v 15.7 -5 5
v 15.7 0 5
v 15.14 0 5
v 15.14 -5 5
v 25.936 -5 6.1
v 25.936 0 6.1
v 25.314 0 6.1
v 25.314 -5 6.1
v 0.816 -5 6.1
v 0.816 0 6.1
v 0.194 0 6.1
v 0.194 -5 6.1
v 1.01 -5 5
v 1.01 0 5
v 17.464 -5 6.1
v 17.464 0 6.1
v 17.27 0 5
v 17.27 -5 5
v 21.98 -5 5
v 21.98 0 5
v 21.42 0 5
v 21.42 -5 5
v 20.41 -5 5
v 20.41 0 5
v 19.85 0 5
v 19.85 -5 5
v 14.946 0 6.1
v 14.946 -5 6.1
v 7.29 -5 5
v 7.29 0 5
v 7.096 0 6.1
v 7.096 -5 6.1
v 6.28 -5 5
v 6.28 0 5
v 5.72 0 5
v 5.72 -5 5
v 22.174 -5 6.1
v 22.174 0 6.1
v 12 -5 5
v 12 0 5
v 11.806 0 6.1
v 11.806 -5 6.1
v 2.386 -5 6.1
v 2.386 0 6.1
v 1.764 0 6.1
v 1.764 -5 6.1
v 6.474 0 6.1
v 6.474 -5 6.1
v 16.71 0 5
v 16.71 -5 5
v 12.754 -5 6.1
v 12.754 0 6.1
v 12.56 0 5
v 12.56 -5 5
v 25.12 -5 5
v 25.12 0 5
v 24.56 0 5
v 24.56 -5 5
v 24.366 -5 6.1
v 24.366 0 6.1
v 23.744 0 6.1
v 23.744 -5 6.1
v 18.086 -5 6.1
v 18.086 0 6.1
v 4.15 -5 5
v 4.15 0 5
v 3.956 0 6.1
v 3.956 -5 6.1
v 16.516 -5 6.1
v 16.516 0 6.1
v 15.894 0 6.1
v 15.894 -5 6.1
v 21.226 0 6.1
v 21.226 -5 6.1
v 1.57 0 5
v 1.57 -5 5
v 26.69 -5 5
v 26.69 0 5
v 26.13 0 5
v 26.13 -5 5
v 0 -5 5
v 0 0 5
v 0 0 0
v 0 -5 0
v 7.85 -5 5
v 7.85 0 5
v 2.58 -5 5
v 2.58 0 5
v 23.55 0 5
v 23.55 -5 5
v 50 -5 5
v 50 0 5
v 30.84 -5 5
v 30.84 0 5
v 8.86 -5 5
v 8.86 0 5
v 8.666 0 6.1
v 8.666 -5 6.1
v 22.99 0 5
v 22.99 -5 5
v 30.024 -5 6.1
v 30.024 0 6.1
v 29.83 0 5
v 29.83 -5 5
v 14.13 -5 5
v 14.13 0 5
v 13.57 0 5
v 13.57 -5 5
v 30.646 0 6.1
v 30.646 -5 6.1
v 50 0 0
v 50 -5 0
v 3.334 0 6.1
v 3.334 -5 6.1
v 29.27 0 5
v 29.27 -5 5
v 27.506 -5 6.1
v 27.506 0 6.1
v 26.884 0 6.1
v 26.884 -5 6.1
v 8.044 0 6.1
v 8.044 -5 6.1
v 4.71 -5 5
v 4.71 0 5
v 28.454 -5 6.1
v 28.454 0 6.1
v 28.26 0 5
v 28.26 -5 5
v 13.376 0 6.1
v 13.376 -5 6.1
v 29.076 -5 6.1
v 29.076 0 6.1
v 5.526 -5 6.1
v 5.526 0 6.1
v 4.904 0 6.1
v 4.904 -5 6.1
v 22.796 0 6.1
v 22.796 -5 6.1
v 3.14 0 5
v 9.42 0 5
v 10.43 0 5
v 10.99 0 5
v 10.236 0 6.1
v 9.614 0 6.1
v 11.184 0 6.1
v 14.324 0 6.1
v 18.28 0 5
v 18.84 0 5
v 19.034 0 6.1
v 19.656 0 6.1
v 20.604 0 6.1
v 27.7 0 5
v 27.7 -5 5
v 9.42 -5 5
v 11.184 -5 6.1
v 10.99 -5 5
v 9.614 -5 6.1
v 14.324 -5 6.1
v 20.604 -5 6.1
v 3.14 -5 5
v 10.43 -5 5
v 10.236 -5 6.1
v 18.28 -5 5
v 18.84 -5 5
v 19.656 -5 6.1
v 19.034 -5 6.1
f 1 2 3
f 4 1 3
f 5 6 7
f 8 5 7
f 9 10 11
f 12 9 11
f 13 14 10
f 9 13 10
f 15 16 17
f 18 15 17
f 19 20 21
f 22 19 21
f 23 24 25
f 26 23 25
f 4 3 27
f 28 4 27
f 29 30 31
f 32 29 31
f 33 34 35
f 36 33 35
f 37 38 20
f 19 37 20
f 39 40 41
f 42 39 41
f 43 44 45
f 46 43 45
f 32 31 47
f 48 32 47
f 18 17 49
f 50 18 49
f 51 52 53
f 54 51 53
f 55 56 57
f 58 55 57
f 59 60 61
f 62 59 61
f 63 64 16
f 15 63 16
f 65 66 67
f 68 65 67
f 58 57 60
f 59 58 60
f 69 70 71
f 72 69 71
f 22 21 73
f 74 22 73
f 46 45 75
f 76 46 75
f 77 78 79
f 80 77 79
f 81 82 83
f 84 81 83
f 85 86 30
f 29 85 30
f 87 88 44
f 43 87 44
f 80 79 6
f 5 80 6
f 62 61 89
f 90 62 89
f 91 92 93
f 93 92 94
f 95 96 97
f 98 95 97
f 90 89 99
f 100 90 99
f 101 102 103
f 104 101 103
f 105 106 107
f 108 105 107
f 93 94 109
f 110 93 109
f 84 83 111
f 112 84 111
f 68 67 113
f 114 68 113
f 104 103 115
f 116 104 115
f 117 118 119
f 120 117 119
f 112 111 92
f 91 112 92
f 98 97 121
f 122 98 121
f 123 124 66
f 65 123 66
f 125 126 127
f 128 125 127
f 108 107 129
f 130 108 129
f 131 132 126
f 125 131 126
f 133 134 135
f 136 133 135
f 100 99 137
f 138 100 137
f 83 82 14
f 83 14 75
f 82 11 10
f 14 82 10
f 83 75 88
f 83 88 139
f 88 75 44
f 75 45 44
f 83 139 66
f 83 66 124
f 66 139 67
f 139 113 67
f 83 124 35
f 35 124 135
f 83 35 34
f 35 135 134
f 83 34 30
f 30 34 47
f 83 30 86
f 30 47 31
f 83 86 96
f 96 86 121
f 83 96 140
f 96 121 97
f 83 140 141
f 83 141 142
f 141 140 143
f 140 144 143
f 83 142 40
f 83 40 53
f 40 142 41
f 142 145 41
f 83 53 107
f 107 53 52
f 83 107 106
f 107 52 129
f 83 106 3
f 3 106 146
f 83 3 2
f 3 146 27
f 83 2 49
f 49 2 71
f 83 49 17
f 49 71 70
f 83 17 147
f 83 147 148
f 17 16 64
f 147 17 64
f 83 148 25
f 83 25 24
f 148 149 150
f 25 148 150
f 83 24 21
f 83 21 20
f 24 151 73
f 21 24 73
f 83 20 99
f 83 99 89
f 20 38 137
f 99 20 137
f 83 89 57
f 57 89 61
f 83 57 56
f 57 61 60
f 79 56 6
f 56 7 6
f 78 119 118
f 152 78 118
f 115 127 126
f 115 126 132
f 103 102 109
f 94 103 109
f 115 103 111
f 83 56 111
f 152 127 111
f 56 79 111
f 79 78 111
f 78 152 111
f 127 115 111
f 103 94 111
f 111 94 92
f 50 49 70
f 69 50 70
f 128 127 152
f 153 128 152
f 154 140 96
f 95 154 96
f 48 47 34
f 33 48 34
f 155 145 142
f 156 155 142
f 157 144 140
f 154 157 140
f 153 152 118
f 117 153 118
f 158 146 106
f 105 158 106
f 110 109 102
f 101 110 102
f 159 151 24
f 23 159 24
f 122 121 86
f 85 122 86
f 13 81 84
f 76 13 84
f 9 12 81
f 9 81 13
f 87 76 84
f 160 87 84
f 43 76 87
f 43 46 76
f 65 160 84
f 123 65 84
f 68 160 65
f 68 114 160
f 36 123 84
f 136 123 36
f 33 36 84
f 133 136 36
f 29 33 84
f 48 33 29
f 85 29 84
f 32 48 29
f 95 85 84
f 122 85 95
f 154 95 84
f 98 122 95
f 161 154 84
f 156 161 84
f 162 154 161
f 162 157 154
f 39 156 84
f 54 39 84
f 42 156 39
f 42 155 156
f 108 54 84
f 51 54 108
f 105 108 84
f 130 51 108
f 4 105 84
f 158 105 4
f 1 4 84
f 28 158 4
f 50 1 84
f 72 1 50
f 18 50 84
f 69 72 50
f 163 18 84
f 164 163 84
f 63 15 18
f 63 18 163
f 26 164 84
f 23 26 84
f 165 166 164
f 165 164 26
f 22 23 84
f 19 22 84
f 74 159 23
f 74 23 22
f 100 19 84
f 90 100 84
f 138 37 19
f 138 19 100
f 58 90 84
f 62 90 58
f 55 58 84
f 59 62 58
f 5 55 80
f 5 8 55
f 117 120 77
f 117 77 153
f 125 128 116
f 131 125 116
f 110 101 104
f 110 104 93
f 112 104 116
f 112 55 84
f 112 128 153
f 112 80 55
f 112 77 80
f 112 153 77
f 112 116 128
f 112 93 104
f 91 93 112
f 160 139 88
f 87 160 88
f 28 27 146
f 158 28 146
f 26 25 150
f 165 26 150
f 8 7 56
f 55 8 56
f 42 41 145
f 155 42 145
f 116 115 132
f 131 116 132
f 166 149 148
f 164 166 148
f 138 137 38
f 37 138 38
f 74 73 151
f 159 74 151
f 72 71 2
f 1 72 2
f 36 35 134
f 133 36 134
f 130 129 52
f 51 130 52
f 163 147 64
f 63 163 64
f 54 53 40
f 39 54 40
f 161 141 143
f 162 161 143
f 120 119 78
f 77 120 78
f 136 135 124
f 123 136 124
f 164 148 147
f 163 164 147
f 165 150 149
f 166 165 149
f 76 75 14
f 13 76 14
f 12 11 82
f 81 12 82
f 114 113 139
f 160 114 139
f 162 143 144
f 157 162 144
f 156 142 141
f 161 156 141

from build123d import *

# Parameters (mm, degrees)
F1_DEPTH = 5


with BuildPart() as f1:
    # F0 (on Front) → F1 (new body)
    with BuildSketch(Plane.XZ):
        Polygon((0, 5), (0, 0), (50, 0), (50, 5), (30.84, 5), (29.83, 5), (29.27, 5), (28.26, 5), (27.7, 5), (26.69, 5), (26.13, 5), (25.12, 5), (24.56, 5), (23.55, 5), (22.99, 5), (21.98, 5), (21.42, 5), (20.41, 5), (19.85, 5), (18.84, 5), (18.28, 5), (17.27, 5), (16.71, 5), (15.7, 5), (15.14, 5), (14.13, 5), (13.57, 5), (12.56, 5), (12, 5), (10.99, 5), (10.43, 5), (9.42, 5), (8.86, 5), (7.85, 5), (7.29, 5), (6.28, 5), (5.72, 5), (4.71, 5), (4.15, 5), (3.14, 5), (2.58, 5), (1.57, 5), (1.01, 5), align=None)
        Polygon((0.19396, 6.1), (0, 5), (1.01, 5), (0.81604, 6.1), align=None)
        Polygon((29.83, 5), (30.84, 5), (30.64604, 6.1), (30.02396, 6.1), align=None)
        Polygon((1.76396, 6.1), (1.57, 5), (2.58, 5), (2.38604, 6.1), align=None)
        Polygon((28.26, 5), (29.27, 5), (29.07604, 6.1), (28.45396, 6.1), align=None)
        Polygon((3.33396, 6.1), (3.14, 5), (4.15, 5), (3.95604, 6.1), align=None)
        Polygon((26.69, 5), (27.7, 5), (27.50604, 6.1), (26.88396, 6.1), align=None)
        Polygon((4.90396, 6.1), (4.71, 5), (5.72, 5), (5.52604, 6.1), align=None)
        Polygon((25.12, 5), (26.13, 5), (25.93604, 6.1), (25.31396, 6.1), align=None)
        Polygon((6.47396, 6.1), (6.28, 5), (7.29, 5), (7.09604, 6.1), align=None)
        Polygon((23.55, 5), (24.56, 5), (24.36604, 6.1), (23.74396, 6.1), align=None)
        Polygon((8.04396, 6.1), (7.85, 5), (8.86, 5), (8.66604, 6.1), align=None)
        Polygon((21.98, 5), (22.99, 5), (22.79604, 6.1), (22.17396, 6.1), align=None)
        Polygon((9.61396, 6.1), (9.42, 5), (10.43, 5), (10.23604, 6.1), align=None)
        Polygon((20.41, 5), (21.42, 5), (21.22604, 6.1), (20.60396, 6.1), align=None)
        Polygon((11.18396, 6.1), (10.99, 5), (12, 5), (11.80604, 6.1), align=None)
        Polygon((18.84, 5), (19.85, 5), (19.65604, 6.1), (19.03396, 6.1), align=None)
        Polygon((12.75396, 6.1), (12.56, 5), (13.57, 5), (13.37604, 6.1), align=None)
        Polygon((17.27, 5), (18.28, 5), (18.08604, 6.1), (17.46396, 6.1), align=None)
        Polygon((14.32396, 6.1), (14.13, 5), (15.14, 5), (14.94604, 6.1), align=None)
        Polygon((15.7, 5), (16.71, 5), (16.51604, 6.1), (15.89396, 6.1), align=None)
    extrude(amount=F1_DEPTH)


solid = f1.part
